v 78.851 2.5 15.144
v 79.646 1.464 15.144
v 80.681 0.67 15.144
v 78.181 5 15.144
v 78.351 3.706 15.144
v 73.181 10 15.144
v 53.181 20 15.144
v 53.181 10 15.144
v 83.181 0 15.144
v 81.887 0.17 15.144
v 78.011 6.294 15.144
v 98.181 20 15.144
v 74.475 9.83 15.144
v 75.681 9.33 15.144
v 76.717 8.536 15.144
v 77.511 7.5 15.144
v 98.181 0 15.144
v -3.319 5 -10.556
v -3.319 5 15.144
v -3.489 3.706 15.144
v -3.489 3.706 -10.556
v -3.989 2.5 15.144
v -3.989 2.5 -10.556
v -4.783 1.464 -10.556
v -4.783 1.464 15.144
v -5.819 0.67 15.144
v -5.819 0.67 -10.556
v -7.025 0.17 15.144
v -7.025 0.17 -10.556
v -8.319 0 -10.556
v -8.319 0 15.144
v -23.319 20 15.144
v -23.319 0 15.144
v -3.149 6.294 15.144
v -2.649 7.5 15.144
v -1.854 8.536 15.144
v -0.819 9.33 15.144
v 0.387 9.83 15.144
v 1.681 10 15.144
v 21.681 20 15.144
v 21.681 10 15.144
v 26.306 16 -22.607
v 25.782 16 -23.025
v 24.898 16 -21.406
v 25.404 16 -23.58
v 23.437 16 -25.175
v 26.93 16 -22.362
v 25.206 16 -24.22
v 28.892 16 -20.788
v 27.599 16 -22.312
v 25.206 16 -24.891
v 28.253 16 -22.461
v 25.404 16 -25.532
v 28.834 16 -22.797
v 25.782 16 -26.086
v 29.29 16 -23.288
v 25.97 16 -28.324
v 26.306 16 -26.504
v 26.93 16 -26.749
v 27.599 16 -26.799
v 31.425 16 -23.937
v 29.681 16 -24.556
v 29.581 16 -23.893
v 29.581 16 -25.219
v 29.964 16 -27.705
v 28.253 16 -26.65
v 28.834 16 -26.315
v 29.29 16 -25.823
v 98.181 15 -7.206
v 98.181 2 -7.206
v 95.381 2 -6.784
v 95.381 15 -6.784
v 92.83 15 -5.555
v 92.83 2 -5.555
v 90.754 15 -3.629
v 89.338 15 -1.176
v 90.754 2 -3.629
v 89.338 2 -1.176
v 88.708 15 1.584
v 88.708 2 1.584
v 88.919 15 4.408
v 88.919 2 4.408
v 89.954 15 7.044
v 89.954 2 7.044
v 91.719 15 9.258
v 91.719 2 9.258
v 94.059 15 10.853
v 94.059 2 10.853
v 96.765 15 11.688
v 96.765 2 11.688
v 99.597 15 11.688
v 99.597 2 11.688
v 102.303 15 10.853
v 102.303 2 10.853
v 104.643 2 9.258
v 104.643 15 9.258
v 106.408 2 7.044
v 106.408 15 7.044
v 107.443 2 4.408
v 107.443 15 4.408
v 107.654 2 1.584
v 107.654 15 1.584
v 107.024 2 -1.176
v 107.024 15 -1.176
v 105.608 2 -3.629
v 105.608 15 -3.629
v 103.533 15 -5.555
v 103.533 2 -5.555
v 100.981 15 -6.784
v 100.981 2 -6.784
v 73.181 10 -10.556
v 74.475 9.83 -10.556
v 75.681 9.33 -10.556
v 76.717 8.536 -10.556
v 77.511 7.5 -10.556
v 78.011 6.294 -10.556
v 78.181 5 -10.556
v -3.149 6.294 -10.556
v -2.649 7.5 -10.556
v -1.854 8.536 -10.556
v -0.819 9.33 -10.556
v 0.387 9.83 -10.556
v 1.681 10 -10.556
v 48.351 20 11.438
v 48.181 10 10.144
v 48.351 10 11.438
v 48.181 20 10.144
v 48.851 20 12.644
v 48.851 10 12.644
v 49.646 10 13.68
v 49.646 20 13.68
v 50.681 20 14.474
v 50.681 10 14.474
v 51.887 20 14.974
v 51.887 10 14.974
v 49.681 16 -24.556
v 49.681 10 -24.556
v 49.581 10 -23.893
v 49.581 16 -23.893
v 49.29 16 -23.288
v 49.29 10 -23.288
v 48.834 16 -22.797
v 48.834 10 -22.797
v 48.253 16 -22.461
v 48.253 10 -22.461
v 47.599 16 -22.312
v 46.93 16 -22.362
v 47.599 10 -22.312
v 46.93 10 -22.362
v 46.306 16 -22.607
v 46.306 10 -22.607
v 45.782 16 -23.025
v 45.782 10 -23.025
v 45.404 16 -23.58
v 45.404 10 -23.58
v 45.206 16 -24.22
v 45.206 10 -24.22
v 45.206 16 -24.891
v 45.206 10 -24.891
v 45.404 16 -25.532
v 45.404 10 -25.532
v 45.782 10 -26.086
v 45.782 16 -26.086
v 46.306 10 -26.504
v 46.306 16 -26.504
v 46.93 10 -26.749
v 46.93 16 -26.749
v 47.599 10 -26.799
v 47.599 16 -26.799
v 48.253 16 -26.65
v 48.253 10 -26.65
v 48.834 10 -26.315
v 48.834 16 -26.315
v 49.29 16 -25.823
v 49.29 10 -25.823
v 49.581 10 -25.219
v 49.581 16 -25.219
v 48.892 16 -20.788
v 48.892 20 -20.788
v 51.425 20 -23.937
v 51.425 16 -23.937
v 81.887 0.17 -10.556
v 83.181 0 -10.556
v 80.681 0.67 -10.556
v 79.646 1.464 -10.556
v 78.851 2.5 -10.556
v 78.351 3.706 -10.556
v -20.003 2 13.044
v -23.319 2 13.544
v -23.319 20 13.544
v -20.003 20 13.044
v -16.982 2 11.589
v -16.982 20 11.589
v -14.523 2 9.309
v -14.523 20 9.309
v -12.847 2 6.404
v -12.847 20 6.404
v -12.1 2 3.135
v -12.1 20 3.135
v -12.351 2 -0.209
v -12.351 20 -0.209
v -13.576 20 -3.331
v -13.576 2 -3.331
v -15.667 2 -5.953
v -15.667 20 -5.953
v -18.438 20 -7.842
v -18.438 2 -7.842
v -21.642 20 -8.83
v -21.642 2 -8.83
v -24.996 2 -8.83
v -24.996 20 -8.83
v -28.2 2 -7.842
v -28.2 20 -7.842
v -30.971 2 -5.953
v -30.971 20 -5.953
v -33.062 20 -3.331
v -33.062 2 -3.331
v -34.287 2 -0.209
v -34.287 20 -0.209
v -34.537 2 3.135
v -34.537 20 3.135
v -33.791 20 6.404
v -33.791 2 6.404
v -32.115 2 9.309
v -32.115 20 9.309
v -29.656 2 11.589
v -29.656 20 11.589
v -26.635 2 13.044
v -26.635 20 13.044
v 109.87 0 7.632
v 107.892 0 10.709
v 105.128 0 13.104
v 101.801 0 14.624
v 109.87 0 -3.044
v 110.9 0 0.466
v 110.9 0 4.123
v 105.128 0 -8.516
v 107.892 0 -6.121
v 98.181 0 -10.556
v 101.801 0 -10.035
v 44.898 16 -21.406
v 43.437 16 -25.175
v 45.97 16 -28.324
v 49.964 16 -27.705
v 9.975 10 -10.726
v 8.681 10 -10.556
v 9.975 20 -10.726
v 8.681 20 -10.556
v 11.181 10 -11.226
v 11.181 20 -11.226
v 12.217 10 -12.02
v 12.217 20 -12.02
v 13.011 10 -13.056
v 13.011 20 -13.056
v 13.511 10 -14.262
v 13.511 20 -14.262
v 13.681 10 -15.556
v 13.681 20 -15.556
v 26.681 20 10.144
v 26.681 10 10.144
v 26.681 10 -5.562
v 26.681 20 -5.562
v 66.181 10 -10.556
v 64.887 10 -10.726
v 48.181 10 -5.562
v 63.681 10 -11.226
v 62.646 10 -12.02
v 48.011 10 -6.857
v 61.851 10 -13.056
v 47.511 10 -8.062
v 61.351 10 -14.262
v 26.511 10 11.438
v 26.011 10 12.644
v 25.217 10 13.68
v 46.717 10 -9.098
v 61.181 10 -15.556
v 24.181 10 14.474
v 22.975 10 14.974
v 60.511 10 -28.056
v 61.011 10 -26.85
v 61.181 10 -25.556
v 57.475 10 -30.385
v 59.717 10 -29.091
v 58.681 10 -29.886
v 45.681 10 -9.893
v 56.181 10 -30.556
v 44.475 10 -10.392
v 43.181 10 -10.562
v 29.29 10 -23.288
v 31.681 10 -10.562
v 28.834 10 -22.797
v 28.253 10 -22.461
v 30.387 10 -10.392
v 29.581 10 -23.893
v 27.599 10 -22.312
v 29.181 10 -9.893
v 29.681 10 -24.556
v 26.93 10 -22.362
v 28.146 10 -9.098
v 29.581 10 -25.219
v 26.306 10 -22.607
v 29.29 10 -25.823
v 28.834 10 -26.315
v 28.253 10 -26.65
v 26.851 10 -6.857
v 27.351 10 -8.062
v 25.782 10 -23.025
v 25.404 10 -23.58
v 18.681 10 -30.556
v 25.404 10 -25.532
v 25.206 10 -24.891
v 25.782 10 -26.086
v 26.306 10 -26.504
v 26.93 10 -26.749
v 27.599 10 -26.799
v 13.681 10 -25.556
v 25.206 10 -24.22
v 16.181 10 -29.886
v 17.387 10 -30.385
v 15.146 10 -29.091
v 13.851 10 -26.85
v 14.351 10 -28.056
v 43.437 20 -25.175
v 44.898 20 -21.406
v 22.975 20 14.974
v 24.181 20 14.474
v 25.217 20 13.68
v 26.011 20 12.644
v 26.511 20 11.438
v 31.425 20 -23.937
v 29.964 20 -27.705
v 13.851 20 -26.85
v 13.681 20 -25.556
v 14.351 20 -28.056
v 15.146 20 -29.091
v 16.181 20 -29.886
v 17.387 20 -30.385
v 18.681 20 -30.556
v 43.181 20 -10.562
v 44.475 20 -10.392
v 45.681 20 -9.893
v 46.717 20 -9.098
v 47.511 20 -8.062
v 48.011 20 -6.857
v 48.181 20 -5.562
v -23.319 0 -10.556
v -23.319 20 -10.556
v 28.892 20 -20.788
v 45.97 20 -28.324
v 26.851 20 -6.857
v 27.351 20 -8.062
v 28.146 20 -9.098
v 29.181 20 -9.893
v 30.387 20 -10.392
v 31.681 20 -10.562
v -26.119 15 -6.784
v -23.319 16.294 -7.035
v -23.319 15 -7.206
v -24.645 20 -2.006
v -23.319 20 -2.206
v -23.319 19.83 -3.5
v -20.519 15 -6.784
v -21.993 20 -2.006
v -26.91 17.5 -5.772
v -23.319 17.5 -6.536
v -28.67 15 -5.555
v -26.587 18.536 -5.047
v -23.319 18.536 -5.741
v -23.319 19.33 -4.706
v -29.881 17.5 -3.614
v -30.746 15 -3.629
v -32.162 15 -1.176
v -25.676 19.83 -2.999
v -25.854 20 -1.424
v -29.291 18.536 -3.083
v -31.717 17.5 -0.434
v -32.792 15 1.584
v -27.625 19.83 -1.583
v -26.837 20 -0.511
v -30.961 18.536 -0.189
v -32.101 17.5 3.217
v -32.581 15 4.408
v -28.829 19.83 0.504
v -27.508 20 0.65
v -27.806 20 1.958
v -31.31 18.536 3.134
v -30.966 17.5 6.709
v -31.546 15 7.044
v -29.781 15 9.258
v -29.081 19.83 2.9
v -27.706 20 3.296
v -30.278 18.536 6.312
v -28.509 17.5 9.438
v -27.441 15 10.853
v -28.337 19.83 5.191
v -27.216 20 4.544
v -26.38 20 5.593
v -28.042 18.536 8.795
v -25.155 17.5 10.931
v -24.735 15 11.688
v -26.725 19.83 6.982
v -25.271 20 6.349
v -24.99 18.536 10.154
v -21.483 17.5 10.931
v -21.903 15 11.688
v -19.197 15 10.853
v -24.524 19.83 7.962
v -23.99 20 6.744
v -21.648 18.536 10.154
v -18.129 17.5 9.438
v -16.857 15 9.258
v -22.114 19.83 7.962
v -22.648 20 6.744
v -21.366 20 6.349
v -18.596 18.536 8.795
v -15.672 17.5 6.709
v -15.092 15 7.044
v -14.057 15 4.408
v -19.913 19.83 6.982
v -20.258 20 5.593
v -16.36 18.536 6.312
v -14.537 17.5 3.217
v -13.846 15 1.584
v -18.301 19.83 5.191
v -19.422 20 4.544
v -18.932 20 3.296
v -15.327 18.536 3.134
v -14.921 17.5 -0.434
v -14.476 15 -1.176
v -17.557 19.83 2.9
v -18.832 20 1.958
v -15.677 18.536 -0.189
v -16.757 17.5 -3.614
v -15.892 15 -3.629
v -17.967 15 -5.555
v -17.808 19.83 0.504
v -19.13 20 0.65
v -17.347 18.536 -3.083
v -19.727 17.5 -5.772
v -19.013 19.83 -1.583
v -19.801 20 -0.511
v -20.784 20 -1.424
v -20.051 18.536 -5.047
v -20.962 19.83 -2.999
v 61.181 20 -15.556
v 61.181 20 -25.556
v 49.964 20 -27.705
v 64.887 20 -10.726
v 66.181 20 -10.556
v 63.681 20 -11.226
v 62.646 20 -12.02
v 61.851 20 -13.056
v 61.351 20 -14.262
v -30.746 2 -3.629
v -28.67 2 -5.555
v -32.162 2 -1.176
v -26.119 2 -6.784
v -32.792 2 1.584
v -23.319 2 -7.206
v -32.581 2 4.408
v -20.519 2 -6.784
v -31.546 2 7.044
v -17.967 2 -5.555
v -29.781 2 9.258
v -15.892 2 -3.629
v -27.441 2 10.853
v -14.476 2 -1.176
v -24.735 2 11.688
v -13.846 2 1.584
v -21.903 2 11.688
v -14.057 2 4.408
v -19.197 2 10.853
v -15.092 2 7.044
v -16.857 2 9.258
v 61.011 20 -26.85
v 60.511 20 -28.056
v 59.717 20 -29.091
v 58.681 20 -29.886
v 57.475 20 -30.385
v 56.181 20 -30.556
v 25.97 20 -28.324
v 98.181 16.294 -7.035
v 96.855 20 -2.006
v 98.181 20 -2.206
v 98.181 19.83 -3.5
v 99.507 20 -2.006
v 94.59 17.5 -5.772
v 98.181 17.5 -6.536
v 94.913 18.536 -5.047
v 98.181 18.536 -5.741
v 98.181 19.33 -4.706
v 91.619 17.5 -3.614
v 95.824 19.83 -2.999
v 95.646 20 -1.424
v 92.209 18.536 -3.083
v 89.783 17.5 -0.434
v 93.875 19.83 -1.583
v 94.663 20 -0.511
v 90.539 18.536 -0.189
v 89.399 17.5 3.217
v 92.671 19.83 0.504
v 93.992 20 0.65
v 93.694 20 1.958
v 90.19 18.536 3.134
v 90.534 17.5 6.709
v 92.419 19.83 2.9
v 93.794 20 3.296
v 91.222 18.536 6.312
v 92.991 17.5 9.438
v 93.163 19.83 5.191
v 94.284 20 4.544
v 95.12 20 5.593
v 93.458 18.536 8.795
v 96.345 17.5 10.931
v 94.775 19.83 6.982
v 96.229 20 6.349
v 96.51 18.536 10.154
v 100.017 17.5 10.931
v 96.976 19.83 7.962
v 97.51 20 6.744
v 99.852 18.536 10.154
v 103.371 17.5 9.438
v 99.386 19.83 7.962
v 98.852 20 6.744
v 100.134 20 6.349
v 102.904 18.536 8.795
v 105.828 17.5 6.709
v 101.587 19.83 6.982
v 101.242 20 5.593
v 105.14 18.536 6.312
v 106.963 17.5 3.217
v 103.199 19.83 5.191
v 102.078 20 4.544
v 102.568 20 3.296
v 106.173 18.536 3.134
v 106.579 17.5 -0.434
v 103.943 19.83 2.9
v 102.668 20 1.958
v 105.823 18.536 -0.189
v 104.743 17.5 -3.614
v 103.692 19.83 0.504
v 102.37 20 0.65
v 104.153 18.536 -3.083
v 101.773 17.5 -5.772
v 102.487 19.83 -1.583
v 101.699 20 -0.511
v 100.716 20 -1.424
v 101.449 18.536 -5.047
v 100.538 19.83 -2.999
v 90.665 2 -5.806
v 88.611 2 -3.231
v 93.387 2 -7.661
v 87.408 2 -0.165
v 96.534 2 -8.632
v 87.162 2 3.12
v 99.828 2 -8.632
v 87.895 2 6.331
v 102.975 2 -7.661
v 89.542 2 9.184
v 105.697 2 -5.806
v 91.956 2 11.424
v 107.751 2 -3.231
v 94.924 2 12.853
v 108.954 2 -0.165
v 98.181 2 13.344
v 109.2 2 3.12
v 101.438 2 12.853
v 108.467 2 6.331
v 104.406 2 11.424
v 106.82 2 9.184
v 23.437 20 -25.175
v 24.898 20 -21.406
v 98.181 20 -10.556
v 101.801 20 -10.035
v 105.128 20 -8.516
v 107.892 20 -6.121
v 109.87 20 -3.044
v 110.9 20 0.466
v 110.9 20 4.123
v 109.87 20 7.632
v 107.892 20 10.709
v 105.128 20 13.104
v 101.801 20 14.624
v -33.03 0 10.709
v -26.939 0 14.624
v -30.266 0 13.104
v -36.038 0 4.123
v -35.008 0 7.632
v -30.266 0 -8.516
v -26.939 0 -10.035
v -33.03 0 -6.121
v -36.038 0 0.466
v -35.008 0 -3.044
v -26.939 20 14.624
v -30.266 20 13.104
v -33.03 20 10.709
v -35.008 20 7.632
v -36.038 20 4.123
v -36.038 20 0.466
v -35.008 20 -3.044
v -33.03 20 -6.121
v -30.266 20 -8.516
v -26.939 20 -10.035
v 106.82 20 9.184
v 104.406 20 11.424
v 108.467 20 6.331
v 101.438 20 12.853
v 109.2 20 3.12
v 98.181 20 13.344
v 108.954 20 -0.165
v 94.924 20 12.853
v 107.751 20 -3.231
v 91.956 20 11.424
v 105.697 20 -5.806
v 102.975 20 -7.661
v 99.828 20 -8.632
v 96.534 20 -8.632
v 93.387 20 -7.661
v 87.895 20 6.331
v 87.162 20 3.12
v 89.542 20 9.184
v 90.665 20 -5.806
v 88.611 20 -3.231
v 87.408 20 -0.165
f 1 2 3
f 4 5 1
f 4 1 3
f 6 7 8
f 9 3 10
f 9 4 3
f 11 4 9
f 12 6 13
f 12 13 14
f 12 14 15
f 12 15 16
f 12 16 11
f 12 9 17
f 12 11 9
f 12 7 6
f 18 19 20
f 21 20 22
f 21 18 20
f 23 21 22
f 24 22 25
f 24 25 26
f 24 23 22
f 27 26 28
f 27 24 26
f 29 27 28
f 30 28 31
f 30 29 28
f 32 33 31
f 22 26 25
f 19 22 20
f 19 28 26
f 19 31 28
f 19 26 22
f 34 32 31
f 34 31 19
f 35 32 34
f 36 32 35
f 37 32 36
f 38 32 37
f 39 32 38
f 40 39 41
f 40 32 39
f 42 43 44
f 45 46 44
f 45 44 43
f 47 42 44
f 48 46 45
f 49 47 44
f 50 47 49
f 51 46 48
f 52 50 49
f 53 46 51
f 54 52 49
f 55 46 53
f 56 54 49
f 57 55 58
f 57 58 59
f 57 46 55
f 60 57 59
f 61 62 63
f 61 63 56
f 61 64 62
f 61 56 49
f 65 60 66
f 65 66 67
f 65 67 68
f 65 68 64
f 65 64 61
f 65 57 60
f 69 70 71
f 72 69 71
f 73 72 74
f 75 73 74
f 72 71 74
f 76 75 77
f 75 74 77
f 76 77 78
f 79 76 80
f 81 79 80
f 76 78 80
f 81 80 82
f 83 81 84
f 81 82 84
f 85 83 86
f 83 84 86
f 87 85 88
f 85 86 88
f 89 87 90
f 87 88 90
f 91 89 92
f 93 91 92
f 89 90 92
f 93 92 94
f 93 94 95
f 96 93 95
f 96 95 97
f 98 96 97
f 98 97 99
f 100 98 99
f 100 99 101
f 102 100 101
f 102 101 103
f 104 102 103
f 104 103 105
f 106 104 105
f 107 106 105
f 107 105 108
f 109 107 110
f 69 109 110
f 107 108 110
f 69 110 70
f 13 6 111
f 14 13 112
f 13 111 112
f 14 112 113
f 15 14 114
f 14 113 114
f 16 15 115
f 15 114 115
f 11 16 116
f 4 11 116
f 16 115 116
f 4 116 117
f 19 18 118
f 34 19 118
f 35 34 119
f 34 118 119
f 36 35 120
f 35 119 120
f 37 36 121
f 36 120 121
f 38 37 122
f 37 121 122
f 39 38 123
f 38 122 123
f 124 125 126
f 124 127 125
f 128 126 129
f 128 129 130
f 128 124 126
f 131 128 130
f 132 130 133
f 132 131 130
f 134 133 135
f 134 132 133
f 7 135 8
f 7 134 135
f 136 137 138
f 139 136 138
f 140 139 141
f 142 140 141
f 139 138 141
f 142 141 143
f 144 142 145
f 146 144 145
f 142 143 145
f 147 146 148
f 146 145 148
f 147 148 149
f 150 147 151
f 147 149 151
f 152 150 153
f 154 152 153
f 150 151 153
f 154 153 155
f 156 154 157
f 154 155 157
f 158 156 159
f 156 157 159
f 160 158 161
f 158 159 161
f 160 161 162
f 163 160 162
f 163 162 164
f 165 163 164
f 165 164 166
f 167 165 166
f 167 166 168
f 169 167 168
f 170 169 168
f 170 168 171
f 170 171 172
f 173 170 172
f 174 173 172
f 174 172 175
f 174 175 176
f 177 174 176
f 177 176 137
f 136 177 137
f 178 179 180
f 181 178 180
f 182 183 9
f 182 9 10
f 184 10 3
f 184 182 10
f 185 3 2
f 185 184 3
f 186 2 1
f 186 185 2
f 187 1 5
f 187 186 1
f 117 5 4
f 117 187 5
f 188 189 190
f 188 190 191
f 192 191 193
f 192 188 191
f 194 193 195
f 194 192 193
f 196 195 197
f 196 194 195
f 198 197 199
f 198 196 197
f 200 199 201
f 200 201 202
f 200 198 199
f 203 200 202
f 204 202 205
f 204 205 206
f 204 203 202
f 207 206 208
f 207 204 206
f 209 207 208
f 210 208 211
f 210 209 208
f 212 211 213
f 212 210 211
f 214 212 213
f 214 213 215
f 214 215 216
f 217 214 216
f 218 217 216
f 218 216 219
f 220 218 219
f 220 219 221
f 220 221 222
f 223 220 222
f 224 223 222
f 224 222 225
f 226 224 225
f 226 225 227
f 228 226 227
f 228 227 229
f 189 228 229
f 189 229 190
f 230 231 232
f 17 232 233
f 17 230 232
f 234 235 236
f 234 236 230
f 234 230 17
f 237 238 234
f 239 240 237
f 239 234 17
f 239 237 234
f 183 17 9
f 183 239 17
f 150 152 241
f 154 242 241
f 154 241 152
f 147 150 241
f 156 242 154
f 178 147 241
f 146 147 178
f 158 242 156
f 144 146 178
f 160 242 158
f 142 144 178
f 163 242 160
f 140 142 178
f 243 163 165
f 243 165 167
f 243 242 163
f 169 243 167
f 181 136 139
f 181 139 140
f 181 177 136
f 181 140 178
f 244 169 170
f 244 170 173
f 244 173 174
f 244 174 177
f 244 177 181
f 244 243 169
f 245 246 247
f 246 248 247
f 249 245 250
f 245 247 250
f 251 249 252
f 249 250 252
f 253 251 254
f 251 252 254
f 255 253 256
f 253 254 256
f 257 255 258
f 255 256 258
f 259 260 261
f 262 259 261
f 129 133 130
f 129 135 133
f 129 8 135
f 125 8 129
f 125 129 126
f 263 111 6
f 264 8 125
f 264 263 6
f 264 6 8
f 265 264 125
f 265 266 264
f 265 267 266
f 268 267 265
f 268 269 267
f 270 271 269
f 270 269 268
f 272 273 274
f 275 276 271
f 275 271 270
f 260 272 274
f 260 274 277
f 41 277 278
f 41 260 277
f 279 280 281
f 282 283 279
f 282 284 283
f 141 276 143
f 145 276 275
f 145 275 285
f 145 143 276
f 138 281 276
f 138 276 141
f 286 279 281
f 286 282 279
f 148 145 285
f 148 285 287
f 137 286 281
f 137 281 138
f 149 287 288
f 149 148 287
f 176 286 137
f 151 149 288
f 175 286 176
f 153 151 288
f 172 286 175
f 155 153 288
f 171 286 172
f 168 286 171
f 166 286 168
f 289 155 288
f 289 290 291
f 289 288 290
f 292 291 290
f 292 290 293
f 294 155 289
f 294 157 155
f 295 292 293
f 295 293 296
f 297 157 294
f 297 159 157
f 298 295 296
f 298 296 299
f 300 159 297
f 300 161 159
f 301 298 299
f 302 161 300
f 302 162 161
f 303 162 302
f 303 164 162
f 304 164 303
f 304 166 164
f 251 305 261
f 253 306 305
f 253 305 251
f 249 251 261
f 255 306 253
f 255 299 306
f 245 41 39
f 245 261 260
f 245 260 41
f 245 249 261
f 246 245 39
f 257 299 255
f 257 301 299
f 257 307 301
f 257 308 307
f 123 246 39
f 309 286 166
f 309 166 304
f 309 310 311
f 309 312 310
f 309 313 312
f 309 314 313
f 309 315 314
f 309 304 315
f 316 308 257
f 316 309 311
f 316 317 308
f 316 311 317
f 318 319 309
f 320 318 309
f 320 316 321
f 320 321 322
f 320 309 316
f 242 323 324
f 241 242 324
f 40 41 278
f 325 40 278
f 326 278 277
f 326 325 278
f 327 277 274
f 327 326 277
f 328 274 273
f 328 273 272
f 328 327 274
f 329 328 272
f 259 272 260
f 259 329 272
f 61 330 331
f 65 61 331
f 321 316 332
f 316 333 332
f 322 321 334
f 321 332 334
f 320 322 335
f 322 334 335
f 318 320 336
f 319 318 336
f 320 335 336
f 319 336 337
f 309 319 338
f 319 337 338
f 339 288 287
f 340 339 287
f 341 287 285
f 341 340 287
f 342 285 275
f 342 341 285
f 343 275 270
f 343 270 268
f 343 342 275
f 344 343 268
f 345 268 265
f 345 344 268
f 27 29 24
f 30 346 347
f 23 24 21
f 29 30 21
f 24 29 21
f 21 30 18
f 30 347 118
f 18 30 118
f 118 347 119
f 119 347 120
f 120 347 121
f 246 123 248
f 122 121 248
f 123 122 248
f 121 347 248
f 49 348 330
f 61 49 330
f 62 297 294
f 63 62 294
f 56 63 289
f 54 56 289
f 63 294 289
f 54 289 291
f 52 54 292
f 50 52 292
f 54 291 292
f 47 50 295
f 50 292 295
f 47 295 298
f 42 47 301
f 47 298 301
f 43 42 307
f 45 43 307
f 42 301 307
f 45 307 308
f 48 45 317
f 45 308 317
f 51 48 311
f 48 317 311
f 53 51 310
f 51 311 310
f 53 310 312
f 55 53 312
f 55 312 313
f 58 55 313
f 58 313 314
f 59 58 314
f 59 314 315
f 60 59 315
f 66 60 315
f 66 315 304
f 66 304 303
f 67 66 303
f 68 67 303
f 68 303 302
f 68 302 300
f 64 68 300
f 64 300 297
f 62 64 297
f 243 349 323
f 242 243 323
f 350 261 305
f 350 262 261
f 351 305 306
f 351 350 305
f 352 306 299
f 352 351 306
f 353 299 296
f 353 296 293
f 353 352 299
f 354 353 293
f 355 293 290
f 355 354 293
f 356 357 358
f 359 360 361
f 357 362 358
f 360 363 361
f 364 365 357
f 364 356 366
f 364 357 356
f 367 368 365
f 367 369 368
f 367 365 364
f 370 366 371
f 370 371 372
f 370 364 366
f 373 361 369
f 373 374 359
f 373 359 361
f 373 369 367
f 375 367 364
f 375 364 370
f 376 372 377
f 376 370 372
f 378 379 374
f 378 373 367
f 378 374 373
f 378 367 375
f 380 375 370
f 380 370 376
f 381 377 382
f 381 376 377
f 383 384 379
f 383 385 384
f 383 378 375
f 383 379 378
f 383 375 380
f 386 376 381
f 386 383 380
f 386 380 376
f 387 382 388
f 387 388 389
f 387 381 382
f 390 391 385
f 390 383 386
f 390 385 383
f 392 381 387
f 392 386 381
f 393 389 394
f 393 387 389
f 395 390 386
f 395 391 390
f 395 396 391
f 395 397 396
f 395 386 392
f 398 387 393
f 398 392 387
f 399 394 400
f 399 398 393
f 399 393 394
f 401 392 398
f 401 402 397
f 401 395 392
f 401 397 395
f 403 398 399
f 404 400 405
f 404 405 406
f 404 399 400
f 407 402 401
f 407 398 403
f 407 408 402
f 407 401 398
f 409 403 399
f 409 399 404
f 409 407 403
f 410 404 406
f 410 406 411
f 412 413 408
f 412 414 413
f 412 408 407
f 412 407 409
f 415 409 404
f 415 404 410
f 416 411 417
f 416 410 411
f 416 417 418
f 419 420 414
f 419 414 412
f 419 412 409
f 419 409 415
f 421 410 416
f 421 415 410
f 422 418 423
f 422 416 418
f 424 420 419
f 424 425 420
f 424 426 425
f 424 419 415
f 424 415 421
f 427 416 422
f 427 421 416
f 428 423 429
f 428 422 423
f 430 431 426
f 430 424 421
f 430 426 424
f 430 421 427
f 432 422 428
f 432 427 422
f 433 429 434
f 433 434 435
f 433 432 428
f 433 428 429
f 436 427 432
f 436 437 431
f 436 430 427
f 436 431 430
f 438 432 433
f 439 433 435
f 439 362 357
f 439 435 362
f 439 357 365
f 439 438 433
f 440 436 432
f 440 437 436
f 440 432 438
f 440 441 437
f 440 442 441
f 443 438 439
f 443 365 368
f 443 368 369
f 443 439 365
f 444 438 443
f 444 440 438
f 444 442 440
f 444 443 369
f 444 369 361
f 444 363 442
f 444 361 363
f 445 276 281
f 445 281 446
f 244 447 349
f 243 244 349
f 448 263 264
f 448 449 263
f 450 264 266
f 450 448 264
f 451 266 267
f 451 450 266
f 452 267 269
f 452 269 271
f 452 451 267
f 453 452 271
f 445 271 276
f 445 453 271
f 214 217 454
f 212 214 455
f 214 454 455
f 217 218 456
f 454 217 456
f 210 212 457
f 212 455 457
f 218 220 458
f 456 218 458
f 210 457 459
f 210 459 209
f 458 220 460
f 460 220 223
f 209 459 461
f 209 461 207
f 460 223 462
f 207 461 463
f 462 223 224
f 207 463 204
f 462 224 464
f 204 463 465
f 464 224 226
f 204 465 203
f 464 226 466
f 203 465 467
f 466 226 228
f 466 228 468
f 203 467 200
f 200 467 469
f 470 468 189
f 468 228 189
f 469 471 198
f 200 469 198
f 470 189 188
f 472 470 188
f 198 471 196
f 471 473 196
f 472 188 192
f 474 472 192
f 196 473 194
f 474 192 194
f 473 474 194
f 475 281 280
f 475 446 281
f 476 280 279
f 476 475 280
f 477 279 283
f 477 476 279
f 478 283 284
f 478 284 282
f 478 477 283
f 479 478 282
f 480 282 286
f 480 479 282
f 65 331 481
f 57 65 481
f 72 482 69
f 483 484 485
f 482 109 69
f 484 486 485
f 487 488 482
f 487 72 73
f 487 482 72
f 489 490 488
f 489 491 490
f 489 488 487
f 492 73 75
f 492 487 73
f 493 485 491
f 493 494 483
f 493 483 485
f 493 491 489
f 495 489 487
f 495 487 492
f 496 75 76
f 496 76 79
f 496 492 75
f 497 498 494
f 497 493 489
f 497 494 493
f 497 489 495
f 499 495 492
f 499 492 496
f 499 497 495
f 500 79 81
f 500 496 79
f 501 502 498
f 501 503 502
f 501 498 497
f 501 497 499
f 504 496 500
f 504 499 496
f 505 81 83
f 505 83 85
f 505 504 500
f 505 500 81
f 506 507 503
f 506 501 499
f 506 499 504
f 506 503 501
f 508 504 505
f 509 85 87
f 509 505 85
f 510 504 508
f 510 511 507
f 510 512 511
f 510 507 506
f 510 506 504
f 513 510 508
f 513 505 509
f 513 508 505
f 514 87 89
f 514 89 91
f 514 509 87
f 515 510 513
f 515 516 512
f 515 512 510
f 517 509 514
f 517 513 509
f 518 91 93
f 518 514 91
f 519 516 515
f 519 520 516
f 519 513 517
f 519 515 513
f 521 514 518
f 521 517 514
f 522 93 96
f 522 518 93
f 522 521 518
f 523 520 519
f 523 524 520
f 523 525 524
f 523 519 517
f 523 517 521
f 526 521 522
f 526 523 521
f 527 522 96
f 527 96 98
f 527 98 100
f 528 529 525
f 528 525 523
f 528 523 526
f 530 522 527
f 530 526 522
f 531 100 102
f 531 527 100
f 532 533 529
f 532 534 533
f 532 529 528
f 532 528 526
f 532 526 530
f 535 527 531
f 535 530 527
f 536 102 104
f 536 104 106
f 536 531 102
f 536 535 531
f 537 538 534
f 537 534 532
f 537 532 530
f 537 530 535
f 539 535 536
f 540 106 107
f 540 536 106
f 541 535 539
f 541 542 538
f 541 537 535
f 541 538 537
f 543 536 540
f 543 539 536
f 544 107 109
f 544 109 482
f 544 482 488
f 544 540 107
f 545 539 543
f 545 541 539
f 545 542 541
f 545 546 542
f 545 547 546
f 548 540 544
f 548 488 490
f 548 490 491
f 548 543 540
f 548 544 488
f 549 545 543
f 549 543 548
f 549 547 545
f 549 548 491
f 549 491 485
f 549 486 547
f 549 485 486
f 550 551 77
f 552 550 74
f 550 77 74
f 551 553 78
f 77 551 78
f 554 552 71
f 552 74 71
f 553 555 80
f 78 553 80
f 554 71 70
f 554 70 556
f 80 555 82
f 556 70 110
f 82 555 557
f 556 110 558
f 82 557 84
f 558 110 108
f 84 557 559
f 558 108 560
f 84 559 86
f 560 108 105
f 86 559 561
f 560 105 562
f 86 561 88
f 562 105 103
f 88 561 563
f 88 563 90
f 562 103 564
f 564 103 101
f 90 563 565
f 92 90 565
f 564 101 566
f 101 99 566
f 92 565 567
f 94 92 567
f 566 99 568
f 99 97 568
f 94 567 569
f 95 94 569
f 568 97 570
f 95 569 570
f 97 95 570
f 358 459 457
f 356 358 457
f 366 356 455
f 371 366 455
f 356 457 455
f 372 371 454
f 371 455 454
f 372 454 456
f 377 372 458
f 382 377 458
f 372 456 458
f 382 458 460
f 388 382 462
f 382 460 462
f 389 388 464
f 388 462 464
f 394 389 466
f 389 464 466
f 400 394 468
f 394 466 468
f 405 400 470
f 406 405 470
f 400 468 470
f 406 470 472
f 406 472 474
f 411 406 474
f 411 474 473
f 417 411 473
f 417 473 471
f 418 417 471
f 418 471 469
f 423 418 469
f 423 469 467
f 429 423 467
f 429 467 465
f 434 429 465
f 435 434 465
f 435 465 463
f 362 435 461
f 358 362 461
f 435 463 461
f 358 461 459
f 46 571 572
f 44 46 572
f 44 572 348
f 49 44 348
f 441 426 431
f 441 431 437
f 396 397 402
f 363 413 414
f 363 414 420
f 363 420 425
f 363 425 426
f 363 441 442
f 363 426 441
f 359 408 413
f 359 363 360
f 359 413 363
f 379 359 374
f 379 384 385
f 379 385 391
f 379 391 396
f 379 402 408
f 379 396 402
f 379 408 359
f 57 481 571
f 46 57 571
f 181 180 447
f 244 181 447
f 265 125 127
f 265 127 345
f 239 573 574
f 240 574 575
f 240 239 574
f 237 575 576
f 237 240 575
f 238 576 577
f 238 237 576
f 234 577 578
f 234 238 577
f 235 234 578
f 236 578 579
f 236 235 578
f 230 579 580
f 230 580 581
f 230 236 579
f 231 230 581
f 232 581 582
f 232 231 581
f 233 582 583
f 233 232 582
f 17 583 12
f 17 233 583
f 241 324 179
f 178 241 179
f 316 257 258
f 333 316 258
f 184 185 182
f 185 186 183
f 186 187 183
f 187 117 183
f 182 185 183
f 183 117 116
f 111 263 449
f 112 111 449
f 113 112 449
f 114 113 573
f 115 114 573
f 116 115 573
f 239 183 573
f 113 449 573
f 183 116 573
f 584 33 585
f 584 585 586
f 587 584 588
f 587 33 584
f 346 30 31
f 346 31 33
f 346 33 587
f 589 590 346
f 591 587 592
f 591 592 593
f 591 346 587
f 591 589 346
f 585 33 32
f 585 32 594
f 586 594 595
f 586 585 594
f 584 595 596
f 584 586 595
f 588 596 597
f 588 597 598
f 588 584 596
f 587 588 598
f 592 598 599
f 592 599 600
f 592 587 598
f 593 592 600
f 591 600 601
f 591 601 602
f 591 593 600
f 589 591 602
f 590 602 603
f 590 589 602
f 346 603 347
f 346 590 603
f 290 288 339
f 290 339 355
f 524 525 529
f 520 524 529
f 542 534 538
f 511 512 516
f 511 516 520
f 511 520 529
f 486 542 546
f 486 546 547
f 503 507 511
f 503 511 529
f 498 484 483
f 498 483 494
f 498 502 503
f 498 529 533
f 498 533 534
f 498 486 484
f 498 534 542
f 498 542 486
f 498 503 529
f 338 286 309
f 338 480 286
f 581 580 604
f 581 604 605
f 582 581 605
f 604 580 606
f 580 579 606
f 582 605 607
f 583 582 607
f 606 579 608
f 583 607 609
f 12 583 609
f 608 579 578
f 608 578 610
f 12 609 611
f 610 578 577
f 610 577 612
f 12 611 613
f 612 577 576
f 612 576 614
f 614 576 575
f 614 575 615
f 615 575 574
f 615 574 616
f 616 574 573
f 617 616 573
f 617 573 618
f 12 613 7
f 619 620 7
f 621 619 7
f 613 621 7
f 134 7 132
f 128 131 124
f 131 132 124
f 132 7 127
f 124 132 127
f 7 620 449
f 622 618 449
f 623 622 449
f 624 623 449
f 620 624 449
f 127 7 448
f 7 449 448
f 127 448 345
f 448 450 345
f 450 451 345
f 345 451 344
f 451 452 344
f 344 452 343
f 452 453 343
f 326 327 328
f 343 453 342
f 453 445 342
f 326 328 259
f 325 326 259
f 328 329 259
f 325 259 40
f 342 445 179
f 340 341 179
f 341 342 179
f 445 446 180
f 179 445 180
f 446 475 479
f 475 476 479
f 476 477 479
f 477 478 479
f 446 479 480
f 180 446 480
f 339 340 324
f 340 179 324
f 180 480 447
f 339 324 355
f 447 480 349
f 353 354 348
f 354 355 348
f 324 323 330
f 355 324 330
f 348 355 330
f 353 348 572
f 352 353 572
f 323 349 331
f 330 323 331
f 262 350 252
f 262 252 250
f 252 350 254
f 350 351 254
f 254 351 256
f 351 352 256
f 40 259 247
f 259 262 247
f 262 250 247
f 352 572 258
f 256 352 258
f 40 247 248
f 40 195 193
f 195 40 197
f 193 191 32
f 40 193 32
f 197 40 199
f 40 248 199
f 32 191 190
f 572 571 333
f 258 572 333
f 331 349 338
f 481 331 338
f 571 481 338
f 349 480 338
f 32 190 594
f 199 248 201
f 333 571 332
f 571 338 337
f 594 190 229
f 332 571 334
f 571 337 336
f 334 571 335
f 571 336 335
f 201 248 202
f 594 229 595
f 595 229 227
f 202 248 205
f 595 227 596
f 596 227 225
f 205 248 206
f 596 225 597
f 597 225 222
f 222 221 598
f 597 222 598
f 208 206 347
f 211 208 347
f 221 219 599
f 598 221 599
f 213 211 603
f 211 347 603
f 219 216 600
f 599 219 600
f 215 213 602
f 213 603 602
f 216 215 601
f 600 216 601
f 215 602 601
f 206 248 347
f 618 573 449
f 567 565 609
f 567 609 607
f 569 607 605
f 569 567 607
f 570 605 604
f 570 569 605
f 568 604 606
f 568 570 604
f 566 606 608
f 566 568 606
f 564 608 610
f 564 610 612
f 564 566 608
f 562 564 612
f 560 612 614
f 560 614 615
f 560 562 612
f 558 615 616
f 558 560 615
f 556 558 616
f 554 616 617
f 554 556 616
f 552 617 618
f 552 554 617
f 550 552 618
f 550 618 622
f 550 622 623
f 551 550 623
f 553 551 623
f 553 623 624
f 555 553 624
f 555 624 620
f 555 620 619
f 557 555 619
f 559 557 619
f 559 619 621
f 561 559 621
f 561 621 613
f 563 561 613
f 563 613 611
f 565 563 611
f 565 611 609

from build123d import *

# Parameters (mm, degrees)
SKETCH1_R           = 11.25
SKETCH1_R_2         = 11.05
BOSS_EXTRUDE1_DEPTH = 20
BOSS_EXTRUDE2_DEPTH = 2
SKETCH3_R           = 9.5
BOSS_EXTRUDE3_DEPTH = 18
SKETCH4_W           = 81.5
SKETCH4_H           = 10
CUT_EXTRUDE1_DEPTH  = 47
FILLET1_START       = -12
FILLET1_DEPTH       = 28
FILLET1_START_2     = -10.55574922
FILLET1_2_DEPTH     = 25.7
SKETCH5_W           = 47.5
SKETCH5_H           = 10
BOSS_EXTRUDE4_DEPTH = 20
FILLET2_R           = 5
SKETCH6_W           = 21.5
SKETCH6_H           = 25.70672576
CUT_EXTRUDE2_DEPTH  = 20
FILLET3_R           = 5
SKETCH7_R           = 2.25
CUT_EXTRUDE3_DEPTH  = 20
CUT_EXTRUDE4_DEPTH  = 4
FILLET4_R           = 5
FILLET5_R           = 5


with BuildPart() as part:
    # Sketch1 → Boss-Extrude1 (new body)
    with BuildSketch(Plane(origin=(0, 0, 0), x_dir=(1, 0, 0), z_dir=(0, 1, 0))):
        with BuildLine():
            Line((98.181049616, -15.14425078), (-23.318950384, -15.14425078))
            ThreePointArc((-23.318950384, -15.14425078), (-36.168950384, -2.29425078), (-23.318950384, 10.55574922))
            Line((-23.318950384, 10.55574922), (98.181049616, 10.55574922))
            ThreePointArc((98.181049616, 10.55574922), (111.031049616, -2.29425078), (98.181049616, -15.14425078))
        make_face()
        with Locations(Location((-23.318950384, -2.29425078, 0), (0, 0, 270))):
            Circle(SKETCH1_R, mode=Mode.SUBTRACT)
        with Locations(Location((98.181049616, -2.29425078, 0), (0, 0, 270))):
            Circle(SKETCH1_R_2, mode=Mode.SUBTRACT)
    extrude(amount=BOSS_EXTRUDE1_DEPTH)

    # Sketch2 → Boss-Extrude2 (add)
    with BuildSketch(Plane.XZ):
        with BuildLine():
            Line((-23.318950384, -10.55574922), (98.181049616, -10.55574922))
            ThreePointArc((98.181049616, -10.55574922), (111.031049616, 2.29425078), (98.181049616, 15.14425078))
            Line((98.181049616, 15.14425078), (-23.318950384, 15.14425078))
            ThreePointArc((-23.318950384, 15.14425078), (-36.168950384, 2.29425078), (-23.318950384, -10.55574922))
        make_face()
    extrude(amount=-BOSS_EXTRUDE2_DEPTH)

    # Sketch3 → Boss-Extrude3 (add)
    with BuildSketch(Plane(origin=(0, 2, 0), x_dir=(1, 0, 0), z_dir=(0, 1, 0))):
        with Locations(Location((-23.318950384, -2.29425078, 0), (0, 0, 90))):
            Circle(SKETCH3_R)
        with Locations(Location((98.181049616, -2.29425078, 0), (0, 0, 90))):
            Circle(SKETCH3_R)
    extrude(amount=BOSS_EXTRUDE3_DEPTH)

    # Sketch4 → Cut-Extrude1 (cut)
    with BuildSketch(Plane(origin=(0, 0, -10.55574922), x_dir=(-1, 0, 0), z_dir=(0, 0, -1))):
        with Locations((-37.431049616, 5)):
            Rectangle(SKETCH4_W, SKETCH4_H)
    extrude(amount=-CUT_EXTRUDE1_DEPTH, mode=Mode.SUBTRACT)

    # Fillet1: read off the stored shape, not the designer's step
    # Fillet1 outline → Fillet1 (cut)
    with BuildSketch(Plane.XY.offset(FILLET1_START)):
        with BuildLine():
            Line((-3.318950384, 0), (-3.318950384, 5))
            ThreePointArc((-3.318950384, 5), (-4.783416479, 1.464466094), (-8.318950384, 0))
            Line((-8.318950384, 0), (-3.318950384, 0))
        make_face()
        with BuildLine():
            ThreePointArc((83.181049616, 0), (79.64551571, 1.464466094), (78.181049616, 5))
            Line((78.181049616, 5), (78.181049616, 0))
            Line((78.181049616, 0), (83.181049616, 0))
        make_face()
    extrude(amount=FILLET1_DEPTH, mode=Mode.SUBTRACT)

    # Fillet1 2 outline → Fillet1 2 (add)
    with BuildSketch(Plane.XY.offset(FILLET1_START_2)):
        with BuildLine():
            Line((78.181049616, 10), (73.181049616, 10))
            ThreePointArc((73.181049616, 10), (76.716583521, 8.535533906), (78.181049616, 5))
            Line((78.181049616, 5), (78.181049616, 10))
        make_face()
        with BuildLine():
            ThreePointArc((-3.318950384, 5), (-1.85448429, 8.535533906), (1.681049616, 10))
            Line((1.681049616, 10), (-3.318950384, 10))
            Line((-3.318950384, 10), (-3.318950384, 5))
        make_face()
    extrude(amount=FILLET1_2_DEPTH)

    # Sketch5 → Boss-Extrude4 (add)
    with BuildSketch(Plane(origin=(0, 0, -10.55574922), x_dir=(-1, 0, 0), z_dir=(0, 0, -1))):
        with Locations((-37.431049616, 15)):
            Rectangle(SKETCH5_W, SKETCH5_H)
    extrude(amount=BOSS_EXTRUDE4_DEPTH)

    # Fillet2
    fillet2_edges = [part.edges().sort_by_distance(p)[0] for p in [
        (13.681049616, 15, -10.55574922),
        (61.181049616, 15, -10.55574922),
        (13.681049616, 15, -30.55574922),
        (61.181049616, 15, -30.55574922),
    ]]
    fillet(fillet2_edges, radius=FILLET2_R)

    # Sketch6 → Cut-Extrude2 (cut)
    with BuildSketch(Plane(origin=(0, 10, 0), x_dir=(-1, 0, 0), z_dir=(0, -1, 0))):
        with Locations((-37.431049616, -2.2908879)):
            Rectangle(SKETCH6_W, SKETCH6_H)
    extrude(amount=-CUT_EXTRUDE2_DEPTH, mode=Mode.SUBTRACT)

    # Fillet3
    fillet3_edges = [part.edges().sort_by_distance(p)[0] for p in [
        (26.681049616, 15, -10.56247498),
        (26.681049616, 15, 15.14425078),
        (48.181049616, 15, 15.14425078),
        (48.181049616, 15, -10.56247498),
    ]]
    fillet(fillet3_edges, radius=FILLET3_R)

    # Sketch7 → Cut-Extrude3 (cut)
    with BuildSketch(Plane(origin=(0, 10, 0), x_dir=(-1, 0, 0), z_dir=(0, -1, 0))):
        with Locations(Location((-27.431049616, 24.55574922, 0), (0, 0, 180))):
            Circle(SKETCH7_R)
        with Locations(Location((-47.431049616, 24.55574922, 0), (0, 0, 180))):
            Circle(SKETCH7_R)
    extrude(amount=-CUT_EXTRUDE3_DEPTH, mode=Mode.SUBTRACT)

    # Sketch8 → Cut-Extrude4 (cut)
    with BuildSketch(Plane(origin=(0, 20, 0), x_dir=(1, 0, 0), z_dir=(0, 1, 0))):
        Polygon((31.424828925, 23.936830678), (29.963938451, 27.705004288), (25.970159141, 28.32392283), (23.437270306, 25.174667762), (24.898160781, 21.406494152), (28.89194009, 20.78757561), align=None)
        Polygon((51.424828925, 23.936830678), (49.963938451, 27.705004288), (45.970159141, 28.32392283), (43.437270306, 25.174667762), (44.898160781, 21.406494152), (48.89194009, 20.78757561), align=None)
    extrude(amount=-CUT_EXTRUDE4_DEPTH, mode=Mode.SUBTRACT)

    # Fillet4
    fillet4_edges = [part.edges().sort_by_distance(p)[0] for p in [
        (-23.318950384, 20, 11.79425078),
    ]]
    fillet(fillet4_edges, radius=FILLET4_R)

    # Fillet5
    fillet5_edges = [part.edges().sort_by_distance(p)[0] for p in [
        (98.181049616, 20, 11.79425078),
    ]]
    fillet(fillet5_edges, radius=FILLET5_R)


solid = part.part
